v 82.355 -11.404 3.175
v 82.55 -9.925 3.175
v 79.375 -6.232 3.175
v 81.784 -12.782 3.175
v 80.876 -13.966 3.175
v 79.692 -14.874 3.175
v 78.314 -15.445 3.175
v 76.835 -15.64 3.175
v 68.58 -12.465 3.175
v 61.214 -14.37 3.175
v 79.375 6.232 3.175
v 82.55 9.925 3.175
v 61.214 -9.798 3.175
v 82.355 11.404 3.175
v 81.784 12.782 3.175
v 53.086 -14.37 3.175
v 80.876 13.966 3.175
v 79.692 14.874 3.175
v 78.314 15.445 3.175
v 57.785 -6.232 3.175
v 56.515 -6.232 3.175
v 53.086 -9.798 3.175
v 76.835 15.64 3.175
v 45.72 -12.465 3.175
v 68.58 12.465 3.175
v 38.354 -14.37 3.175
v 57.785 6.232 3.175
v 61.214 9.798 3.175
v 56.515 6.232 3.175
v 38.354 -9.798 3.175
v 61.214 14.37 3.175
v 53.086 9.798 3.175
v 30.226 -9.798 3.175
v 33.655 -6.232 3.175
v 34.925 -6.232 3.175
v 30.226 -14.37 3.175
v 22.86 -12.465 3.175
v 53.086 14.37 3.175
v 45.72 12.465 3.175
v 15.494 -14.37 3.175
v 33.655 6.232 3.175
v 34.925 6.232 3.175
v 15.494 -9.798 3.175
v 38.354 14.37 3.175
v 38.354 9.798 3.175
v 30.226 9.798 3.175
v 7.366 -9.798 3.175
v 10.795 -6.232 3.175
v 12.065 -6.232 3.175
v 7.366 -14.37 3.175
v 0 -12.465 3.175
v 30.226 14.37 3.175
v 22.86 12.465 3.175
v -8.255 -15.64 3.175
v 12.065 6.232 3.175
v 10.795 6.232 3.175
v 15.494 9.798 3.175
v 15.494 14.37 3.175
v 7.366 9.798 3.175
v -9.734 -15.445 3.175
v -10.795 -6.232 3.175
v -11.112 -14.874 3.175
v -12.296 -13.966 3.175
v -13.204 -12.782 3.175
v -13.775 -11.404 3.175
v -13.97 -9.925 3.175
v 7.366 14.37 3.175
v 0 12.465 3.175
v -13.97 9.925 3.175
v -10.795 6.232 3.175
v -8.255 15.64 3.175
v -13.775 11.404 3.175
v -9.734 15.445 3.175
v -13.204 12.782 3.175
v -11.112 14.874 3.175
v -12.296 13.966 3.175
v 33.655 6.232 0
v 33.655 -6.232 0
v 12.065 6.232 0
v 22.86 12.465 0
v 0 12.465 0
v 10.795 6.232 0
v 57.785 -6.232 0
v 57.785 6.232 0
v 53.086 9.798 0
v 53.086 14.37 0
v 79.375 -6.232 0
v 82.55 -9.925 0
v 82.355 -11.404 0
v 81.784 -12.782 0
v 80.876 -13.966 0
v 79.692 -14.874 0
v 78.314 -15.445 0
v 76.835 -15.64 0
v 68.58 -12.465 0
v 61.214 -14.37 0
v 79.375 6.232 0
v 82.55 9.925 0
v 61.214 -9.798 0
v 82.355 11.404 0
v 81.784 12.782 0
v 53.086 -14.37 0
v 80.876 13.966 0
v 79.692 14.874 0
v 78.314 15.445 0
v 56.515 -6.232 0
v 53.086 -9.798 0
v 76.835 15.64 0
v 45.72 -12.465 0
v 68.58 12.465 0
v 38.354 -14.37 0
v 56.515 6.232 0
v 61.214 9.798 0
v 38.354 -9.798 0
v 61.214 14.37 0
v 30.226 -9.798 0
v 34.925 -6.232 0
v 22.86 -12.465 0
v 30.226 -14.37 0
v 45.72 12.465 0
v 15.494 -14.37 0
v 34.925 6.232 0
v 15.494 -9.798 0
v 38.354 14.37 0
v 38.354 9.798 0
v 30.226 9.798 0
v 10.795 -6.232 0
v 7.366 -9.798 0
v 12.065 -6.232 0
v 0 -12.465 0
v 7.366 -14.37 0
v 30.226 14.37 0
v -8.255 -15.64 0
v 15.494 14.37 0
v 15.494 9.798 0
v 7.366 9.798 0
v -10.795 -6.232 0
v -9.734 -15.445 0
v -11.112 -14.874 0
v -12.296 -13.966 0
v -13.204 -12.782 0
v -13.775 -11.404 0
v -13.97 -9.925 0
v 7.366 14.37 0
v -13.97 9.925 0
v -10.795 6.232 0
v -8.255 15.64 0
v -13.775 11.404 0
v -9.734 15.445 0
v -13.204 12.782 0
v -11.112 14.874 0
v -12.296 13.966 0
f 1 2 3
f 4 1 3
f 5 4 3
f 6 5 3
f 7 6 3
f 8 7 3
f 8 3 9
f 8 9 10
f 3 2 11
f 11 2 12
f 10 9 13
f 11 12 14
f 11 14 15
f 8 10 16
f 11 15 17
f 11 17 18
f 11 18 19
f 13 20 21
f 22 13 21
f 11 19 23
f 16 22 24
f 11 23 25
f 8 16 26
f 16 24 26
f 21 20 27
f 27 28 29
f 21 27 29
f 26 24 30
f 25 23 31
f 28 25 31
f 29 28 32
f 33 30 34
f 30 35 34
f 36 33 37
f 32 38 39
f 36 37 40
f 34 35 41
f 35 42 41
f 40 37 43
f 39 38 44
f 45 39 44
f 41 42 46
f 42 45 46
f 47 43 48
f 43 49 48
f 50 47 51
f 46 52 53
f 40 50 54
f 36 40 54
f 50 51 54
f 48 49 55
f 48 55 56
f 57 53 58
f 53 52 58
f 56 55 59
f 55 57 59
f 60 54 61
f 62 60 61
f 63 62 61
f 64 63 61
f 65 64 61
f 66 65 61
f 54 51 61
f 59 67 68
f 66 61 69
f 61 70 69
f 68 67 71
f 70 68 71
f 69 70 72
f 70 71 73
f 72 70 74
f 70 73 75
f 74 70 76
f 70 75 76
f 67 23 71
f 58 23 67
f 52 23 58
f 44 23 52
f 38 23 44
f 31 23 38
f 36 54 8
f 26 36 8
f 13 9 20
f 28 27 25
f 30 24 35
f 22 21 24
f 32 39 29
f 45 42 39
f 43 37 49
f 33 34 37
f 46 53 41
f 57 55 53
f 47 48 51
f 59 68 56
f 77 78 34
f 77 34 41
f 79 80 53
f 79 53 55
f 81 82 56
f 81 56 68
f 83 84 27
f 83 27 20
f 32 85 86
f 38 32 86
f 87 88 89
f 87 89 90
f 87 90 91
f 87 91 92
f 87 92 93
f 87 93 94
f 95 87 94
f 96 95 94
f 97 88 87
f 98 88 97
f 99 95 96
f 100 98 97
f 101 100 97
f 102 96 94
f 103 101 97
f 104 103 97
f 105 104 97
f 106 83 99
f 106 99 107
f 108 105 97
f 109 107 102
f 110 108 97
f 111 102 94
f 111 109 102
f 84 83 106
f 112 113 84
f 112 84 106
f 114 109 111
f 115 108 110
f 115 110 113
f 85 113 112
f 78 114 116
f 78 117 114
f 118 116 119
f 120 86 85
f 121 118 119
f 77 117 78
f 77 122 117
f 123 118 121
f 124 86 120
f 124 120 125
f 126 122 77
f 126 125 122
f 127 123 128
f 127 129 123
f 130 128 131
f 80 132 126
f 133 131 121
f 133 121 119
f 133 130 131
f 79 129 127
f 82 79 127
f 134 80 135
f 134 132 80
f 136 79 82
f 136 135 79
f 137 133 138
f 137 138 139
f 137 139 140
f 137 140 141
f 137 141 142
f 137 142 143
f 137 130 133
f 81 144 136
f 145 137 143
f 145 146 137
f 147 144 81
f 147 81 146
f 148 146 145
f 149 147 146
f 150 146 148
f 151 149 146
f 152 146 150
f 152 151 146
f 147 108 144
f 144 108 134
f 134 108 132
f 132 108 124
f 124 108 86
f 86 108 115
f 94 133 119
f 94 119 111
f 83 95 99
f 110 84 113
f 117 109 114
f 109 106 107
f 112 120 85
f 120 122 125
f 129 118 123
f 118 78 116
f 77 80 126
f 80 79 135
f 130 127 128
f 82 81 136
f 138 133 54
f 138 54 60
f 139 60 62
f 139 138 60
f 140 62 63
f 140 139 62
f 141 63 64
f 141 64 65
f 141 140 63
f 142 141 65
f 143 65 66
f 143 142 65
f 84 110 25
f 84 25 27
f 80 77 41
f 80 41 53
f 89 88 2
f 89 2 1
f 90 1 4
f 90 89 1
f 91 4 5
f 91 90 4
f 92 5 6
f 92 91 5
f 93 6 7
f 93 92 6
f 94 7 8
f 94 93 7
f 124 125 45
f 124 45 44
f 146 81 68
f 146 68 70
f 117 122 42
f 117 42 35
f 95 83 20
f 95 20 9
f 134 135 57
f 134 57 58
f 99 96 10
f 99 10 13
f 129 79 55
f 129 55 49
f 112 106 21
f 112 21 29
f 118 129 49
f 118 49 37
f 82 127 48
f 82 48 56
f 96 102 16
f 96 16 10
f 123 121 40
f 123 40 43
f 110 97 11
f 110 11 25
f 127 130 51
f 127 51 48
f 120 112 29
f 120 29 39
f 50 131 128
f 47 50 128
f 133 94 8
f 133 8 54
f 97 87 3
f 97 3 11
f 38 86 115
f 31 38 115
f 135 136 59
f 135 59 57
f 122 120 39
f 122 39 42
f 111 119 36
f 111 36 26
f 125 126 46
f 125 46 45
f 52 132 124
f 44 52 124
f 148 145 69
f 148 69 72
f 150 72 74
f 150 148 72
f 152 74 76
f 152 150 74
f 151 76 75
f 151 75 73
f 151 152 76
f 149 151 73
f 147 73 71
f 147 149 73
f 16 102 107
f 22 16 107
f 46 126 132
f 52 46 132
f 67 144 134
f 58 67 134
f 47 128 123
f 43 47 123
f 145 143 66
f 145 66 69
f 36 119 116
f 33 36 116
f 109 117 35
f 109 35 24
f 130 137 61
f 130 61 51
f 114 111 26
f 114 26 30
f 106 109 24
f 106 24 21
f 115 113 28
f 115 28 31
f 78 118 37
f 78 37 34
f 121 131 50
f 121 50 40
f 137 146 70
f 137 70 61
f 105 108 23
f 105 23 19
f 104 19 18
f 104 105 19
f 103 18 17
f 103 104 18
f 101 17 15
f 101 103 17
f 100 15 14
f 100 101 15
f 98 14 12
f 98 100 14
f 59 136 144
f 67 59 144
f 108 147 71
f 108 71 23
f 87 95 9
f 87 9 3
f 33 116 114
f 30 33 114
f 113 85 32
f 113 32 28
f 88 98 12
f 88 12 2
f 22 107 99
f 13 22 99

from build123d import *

# Parameters (mm, degrees)
SKETCH1_W           = 8.128
SKETCH1_H           = 4.572
BOSS_EXTRUDE1_DEPTH = 3.175


with BuildPart() as part:
    # Sketch1 → Boss-Extrude1 (new body)
    with BuildSketch(Plane.XY):
        with BuildLine():
            Line((-8.255, 15.639992312), (76.835, 15.639992312))
            ThreePointArc((76.835, 15.639992312), (80.876115254, 13.966107566), (82.55, 9.924992312))
            Line((82.55, 9.924992312), (82.55, -9.924992312))
            ThreePointArc((82.55, -9.924992312), (80.876115254, -13.966107566), (76.835, -15.639992312))
            Line((76.835, -15.639992312), (-8.255, -15.639992312))
            ThreePointArc((-8.255, -15.639992312), (-12.296115254, -13.966107566), (-13.97, -9.924992312))
            Line((-13.97, -9.924992312), (-13.97, 9.924992312))
            ThreePointArc((-13.97, 9.924992312), (-12.296115254, 13.966107566), (-8.255, 15.639992312))
        make_face()
        Polygon((12.065, -6.232496156), (22.86, -12.464992312), (33.655, -6.232496156), (33.655, 6.232496156), (22.86, 12.464992312), (12.065, 6.232496156), align=None, mode=Mode.SUBTRACT)
        Polygon((34.925, -6.232496156), (45.72, -12.464992312), (56.515, -6.232496156), (56.515, 6.232496156), (45.72, 12.464992312), (34.925, 6.232496156), align=None, mode=Mode.SUBTRACT)
        Polygon((-10.795, -6.232496156), (0, -12.464992312), (10.795, -6.232496156), (10.795, 6.232496156), (0, 12.464992312), (-10.795, 6.232496156), align=None, mode=Mode.SUBTRACT)
        Polygon((57.785, -6.232496156), (68.58, -12.464992312), (79.375, -6.232496156), (79.375, 6.232496156), (68.58, 12.464992312), (57.785, 6.232496156), align=None, mode=Mode.SUBTRACT)
        with Locations((34.29, 12.083992312)):
            Rectangle(SKETCH1_W, SKETCH1_H, mode=Mode.SUBTRACT)
        with Locations((11.43, 12.083992312)):
            Rectangle(SKETCH1_W, SKETCH1_H, mode=Mode.SUBTRACT)
        with Locations((57.15, 12.083992312)):
            Rectangle(SKETCH1_W, SKETCH1_H, mode=Mode.SUBTRACT)
        with Locations((57.15, -12.083992312)):
            Rectangle(SKETCH1_W, SKETCH1_H, mode=Mode.SUBTRACT)
        with Locations((34.29, -12.083992312)):
            Rectangle(SKETCH1_W, SKETCH1_H, mode=Mode.SUBTRACT)
        with Locations((11.43, -12.083992312)):
            Rectangle(SKETCH1_W, SKETCH1_H, mode=Mode.SUBTRACT)
    extrude(amount=BOSS_EXTRUDE1_DEPTH)


solid = part.part
